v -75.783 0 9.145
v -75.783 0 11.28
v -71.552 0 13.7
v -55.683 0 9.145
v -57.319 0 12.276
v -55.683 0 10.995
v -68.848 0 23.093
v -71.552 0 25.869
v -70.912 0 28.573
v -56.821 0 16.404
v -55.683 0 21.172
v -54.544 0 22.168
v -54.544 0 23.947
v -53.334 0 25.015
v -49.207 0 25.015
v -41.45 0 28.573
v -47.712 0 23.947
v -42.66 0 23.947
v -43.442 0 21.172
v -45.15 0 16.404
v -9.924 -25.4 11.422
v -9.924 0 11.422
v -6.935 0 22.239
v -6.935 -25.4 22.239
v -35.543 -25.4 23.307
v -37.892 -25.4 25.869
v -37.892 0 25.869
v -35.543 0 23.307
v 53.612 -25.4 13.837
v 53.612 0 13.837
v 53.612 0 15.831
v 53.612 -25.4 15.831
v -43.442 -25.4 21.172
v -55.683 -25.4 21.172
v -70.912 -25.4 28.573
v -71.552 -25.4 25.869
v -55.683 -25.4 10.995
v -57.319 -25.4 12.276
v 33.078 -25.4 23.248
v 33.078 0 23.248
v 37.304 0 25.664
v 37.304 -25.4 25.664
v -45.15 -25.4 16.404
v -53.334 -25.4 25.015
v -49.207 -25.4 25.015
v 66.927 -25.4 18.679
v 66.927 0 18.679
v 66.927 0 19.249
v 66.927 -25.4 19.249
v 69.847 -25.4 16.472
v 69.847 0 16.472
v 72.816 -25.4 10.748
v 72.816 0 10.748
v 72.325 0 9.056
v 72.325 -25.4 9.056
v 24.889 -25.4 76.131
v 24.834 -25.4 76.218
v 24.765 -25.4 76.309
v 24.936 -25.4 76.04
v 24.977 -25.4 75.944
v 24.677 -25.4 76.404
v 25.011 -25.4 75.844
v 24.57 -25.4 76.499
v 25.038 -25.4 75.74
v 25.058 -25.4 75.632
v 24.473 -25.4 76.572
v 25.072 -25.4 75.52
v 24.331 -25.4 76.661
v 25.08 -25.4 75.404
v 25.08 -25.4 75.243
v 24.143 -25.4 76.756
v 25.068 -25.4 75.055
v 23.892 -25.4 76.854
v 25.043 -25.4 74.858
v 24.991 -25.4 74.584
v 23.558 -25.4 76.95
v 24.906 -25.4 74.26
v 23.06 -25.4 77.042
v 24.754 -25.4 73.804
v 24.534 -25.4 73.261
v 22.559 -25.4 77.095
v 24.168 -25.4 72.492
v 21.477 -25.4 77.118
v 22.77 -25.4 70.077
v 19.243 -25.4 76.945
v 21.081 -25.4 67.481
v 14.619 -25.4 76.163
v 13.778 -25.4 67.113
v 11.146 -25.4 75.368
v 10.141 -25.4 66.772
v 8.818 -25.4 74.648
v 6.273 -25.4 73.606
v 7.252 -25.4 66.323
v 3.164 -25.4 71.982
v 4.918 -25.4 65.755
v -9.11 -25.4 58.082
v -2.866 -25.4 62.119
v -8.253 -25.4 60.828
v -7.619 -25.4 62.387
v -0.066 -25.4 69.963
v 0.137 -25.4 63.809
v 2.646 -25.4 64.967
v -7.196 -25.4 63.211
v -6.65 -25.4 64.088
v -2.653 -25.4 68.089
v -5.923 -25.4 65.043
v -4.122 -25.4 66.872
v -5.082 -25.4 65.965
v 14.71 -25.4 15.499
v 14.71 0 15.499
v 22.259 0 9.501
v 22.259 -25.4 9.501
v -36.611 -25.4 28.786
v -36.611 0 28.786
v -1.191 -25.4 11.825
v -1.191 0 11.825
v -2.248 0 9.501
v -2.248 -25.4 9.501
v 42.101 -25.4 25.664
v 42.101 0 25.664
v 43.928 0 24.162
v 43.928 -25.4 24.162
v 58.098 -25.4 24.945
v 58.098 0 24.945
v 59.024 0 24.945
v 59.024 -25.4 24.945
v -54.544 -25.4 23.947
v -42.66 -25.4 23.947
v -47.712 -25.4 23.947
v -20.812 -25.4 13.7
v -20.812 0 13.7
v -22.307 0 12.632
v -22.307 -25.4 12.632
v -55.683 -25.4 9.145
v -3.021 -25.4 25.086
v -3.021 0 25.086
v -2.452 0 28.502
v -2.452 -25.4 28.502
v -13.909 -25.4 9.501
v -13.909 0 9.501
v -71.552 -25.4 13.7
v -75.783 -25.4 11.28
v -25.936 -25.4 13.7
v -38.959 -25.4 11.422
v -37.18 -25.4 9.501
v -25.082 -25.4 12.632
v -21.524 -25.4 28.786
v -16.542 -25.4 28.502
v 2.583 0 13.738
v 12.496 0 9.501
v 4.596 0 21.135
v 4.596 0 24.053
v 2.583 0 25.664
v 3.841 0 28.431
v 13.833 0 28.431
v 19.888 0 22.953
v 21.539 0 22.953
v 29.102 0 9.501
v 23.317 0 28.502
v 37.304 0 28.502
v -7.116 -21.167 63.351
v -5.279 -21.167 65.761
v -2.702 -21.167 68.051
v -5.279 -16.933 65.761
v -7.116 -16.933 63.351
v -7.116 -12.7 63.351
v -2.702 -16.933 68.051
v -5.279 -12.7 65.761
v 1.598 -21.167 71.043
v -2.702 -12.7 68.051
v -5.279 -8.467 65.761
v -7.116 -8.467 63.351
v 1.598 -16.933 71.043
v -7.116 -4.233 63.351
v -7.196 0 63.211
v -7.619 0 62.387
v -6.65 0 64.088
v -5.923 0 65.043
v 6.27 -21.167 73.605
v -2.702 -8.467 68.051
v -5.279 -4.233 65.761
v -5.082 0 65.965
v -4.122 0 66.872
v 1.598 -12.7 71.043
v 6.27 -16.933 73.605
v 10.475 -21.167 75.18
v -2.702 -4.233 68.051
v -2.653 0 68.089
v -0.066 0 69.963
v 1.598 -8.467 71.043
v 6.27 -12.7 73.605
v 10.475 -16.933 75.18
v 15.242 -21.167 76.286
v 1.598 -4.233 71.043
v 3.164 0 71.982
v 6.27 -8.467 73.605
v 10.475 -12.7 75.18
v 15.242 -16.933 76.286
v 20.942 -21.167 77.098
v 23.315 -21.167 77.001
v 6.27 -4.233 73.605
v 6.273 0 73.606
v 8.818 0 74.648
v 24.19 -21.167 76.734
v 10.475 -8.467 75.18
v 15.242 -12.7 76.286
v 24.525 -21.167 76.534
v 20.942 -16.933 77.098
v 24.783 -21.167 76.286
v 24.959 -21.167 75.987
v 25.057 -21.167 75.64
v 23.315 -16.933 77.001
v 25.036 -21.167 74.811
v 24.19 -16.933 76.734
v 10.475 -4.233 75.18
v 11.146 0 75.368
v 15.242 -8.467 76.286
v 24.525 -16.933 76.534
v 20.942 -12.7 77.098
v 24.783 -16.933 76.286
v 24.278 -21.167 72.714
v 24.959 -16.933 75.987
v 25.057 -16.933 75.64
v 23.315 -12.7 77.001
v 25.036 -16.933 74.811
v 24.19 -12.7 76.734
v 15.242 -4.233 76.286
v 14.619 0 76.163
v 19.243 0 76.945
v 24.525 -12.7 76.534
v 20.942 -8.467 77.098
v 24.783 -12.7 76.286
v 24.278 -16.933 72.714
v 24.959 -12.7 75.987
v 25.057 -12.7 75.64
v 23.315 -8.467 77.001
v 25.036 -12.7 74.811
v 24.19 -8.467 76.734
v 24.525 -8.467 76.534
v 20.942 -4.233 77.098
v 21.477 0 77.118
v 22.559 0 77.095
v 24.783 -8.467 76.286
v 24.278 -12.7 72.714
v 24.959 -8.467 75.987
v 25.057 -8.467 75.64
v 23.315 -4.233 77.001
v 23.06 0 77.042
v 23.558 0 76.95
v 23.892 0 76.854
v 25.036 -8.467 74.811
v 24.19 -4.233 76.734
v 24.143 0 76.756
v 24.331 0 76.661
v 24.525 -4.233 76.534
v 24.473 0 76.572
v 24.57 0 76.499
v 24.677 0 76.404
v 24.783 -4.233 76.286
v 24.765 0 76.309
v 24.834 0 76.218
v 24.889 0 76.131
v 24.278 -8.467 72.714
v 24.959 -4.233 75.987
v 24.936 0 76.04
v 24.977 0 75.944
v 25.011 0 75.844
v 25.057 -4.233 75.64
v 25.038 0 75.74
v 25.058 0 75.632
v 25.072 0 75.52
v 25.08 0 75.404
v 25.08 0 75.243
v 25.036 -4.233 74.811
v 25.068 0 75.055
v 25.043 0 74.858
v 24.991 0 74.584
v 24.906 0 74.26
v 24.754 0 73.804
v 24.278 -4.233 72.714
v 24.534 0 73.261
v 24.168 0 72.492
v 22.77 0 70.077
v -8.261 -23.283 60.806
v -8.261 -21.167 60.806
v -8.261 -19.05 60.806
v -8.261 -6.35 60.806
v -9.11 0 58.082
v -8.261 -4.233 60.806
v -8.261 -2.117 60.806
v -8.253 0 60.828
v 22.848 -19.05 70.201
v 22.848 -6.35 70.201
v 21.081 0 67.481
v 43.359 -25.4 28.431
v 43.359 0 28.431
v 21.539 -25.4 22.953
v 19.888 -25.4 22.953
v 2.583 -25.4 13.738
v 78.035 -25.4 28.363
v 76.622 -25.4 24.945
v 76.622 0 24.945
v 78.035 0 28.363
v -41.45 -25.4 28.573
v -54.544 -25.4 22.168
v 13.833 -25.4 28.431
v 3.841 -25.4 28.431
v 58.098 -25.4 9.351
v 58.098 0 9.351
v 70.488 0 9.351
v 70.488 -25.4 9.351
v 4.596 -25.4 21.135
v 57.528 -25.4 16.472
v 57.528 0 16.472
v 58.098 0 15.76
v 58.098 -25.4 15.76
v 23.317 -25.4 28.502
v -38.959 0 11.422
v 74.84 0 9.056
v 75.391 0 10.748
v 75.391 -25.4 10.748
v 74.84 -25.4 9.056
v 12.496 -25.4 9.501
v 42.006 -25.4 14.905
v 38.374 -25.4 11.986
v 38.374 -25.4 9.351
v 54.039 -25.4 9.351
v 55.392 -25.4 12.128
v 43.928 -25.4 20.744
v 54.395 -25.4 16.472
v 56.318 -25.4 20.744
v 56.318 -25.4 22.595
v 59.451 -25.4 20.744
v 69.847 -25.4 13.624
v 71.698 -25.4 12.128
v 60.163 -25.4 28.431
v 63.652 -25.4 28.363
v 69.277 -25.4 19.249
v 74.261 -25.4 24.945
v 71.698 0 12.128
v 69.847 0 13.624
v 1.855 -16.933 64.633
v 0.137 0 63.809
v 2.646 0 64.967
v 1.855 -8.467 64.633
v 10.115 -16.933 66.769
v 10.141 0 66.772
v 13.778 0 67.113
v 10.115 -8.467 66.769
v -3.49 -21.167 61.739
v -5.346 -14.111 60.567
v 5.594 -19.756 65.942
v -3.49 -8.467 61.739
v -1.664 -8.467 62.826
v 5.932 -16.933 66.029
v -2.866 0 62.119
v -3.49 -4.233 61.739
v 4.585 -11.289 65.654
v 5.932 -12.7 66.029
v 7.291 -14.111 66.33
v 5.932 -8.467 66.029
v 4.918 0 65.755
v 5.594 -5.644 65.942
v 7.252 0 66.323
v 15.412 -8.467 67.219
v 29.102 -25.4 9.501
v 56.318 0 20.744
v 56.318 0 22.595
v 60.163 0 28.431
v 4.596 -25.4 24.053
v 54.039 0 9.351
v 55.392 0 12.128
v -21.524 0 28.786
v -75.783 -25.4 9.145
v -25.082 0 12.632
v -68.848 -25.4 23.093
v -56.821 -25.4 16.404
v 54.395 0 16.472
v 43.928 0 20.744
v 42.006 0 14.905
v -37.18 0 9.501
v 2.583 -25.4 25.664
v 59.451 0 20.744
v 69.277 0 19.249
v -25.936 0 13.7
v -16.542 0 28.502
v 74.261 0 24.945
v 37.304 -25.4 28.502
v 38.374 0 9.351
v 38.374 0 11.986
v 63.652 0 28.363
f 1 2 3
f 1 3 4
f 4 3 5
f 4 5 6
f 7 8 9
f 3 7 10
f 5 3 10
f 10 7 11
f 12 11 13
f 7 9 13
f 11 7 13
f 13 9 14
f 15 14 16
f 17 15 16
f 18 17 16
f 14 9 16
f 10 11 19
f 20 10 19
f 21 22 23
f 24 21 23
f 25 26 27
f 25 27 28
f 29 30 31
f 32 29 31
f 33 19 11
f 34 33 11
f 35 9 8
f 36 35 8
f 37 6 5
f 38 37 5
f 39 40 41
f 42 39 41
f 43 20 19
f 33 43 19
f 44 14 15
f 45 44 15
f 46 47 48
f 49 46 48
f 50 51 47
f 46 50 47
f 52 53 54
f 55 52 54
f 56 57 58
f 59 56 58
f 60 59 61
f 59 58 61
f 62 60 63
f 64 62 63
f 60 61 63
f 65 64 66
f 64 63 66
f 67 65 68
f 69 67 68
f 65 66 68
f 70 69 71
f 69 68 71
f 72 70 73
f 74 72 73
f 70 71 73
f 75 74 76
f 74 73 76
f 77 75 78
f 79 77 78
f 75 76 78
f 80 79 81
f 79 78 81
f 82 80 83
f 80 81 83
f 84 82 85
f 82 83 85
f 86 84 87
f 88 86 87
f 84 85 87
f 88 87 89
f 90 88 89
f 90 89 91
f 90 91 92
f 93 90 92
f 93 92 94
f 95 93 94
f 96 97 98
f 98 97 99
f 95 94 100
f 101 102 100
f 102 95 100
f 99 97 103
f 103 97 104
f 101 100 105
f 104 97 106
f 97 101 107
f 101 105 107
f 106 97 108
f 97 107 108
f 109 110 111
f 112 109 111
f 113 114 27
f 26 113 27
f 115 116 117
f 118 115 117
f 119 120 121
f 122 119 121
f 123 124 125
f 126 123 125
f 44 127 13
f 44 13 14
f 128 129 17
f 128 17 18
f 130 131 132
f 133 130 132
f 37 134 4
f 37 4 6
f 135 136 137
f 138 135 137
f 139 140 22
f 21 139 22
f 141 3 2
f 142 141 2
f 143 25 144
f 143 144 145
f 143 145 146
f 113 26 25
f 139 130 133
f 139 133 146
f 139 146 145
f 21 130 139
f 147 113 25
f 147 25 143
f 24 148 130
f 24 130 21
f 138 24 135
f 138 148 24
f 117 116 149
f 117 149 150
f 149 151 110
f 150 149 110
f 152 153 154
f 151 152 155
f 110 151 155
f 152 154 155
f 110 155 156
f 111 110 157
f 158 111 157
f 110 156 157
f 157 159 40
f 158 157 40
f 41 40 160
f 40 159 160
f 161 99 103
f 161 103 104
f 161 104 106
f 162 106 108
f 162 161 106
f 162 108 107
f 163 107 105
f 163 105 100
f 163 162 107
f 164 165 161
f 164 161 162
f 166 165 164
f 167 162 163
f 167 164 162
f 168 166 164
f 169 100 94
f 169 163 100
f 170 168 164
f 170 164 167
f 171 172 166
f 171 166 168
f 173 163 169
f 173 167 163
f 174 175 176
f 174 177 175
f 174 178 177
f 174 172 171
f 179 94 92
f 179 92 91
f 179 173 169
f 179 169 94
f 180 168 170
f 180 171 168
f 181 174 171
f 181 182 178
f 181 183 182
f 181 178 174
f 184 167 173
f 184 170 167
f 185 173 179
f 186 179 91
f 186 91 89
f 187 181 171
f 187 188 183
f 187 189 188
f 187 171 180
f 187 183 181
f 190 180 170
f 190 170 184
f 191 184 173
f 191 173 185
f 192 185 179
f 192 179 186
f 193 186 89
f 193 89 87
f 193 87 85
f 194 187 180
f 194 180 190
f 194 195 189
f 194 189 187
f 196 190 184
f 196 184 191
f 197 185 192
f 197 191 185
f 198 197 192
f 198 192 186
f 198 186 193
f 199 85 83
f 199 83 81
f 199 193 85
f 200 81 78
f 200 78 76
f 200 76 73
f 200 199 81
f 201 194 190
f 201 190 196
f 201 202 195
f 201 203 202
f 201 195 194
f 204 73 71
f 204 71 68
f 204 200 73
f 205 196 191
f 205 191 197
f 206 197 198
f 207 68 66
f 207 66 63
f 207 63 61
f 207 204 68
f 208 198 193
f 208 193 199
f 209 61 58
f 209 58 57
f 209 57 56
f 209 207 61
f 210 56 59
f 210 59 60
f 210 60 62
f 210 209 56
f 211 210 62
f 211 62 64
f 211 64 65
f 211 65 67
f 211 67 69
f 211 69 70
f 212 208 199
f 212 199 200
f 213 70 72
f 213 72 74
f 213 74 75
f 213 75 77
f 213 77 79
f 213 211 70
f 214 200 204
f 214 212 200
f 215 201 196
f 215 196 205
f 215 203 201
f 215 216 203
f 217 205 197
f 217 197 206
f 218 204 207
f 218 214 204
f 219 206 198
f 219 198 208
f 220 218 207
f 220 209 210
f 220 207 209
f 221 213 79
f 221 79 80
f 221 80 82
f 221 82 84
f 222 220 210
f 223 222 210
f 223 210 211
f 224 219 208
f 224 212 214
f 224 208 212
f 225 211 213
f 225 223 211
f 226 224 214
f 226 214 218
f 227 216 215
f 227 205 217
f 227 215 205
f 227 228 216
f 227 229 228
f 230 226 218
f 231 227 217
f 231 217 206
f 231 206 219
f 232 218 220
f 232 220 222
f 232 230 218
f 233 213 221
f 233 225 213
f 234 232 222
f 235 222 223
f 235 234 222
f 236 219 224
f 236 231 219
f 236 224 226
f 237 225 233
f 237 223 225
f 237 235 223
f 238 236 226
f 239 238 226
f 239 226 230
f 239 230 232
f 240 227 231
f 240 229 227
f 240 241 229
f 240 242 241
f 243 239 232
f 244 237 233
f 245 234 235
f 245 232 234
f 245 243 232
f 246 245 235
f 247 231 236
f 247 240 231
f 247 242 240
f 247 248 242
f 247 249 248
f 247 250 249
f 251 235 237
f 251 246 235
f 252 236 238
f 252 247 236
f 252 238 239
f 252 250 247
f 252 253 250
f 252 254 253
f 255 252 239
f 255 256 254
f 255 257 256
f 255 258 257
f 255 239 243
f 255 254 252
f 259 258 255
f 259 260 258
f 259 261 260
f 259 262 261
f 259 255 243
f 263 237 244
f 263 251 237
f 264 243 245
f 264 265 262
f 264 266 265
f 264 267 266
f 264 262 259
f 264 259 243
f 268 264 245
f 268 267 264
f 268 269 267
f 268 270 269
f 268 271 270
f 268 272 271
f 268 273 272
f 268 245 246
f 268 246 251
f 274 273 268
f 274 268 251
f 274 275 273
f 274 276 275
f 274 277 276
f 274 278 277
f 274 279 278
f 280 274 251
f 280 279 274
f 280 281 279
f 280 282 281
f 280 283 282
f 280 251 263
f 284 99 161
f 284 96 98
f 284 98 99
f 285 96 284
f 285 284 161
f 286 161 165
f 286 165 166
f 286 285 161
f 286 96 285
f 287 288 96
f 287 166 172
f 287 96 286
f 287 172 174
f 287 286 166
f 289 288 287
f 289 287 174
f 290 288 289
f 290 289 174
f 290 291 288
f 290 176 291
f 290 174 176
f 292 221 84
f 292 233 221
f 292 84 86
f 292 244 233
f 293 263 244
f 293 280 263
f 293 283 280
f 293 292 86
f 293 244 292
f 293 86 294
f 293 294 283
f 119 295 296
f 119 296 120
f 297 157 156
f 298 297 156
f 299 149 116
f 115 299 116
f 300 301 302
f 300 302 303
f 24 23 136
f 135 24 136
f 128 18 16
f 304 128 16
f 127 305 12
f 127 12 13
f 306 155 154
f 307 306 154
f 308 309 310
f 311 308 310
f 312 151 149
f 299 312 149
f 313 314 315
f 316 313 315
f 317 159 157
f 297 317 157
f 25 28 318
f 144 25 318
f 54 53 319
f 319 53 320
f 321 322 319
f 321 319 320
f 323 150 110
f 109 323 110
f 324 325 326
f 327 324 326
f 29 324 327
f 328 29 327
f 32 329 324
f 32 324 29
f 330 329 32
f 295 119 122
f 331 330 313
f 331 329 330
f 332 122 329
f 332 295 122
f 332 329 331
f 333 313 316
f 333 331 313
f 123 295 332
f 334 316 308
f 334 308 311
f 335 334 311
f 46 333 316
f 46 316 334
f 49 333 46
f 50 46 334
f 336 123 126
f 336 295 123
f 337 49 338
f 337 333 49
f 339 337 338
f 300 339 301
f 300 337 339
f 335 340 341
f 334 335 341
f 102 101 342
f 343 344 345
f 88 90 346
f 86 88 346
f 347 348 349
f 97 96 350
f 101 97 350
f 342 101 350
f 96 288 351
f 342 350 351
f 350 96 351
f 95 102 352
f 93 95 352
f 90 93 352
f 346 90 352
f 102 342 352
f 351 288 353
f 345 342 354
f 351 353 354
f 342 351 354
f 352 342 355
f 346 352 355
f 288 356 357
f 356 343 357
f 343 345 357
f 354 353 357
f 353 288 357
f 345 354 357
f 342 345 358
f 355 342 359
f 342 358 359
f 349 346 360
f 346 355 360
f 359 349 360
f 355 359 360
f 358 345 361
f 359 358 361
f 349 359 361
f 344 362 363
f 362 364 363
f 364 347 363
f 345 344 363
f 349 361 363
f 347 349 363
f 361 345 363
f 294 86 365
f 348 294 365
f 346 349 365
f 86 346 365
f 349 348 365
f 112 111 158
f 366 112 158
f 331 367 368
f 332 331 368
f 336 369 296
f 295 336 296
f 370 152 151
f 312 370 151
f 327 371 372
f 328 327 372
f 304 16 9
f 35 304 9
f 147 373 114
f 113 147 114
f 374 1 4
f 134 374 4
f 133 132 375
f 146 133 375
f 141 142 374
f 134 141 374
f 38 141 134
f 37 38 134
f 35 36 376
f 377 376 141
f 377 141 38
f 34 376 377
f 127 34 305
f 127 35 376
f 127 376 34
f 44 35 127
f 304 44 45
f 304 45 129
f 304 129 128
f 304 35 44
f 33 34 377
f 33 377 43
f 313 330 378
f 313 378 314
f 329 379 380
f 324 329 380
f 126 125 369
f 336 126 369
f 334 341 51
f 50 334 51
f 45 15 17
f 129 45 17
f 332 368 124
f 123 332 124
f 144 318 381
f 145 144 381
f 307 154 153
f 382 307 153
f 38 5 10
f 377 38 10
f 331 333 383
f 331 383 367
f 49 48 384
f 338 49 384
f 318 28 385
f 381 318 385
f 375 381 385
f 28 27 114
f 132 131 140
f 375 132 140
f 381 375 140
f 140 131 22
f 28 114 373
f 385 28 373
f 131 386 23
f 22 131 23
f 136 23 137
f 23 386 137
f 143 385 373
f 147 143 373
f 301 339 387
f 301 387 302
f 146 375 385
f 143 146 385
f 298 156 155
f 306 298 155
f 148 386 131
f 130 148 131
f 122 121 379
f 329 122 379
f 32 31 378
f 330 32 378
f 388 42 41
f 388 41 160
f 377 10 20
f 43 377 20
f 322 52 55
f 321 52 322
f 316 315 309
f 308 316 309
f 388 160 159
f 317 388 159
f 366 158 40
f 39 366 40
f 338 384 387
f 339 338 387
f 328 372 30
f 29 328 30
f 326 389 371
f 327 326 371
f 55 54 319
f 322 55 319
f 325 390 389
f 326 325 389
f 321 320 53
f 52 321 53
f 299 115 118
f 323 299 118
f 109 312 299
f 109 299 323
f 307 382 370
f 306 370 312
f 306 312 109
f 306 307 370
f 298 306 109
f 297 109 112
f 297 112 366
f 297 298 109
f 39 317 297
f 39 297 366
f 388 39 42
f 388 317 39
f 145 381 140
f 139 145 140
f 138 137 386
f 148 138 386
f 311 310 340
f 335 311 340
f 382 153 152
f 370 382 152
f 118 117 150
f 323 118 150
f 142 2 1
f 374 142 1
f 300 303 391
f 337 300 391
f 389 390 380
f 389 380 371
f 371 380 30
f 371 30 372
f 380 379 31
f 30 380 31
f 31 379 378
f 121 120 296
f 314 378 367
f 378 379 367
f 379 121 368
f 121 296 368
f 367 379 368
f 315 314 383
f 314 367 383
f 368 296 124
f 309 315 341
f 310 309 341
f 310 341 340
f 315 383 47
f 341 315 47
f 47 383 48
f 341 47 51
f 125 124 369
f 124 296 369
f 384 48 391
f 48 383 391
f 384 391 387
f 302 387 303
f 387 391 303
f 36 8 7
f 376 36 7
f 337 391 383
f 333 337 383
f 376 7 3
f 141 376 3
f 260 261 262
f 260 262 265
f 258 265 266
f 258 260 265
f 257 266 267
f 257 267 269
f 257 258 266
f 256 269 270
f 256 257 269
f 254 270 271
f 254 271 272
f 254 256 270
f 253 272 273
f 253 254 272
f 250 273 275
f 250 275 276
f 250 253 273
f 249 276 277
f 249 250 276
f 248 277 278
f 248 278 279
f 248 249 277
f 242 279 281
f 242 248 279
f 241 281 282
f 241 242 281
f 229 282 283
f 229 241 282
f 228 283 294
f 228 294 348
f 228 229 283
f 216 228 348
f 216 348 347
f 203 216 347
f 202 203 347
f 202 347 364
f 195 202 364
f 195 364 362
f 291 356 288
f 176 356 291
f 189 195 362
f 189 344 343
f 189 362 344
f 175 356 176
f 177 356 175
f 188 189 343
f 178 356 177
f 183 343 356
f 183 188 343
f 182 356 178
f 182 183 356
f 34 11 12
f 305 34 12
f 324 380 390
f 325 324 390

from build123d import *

# Parameters (mm, degrees)
F1_DEPTH = 25.4


with BuildPart() as f1:
    # F0 (on Front) → F1 (new body)
    with BuildSketch(Plane.XZ):
        Polygon((-41.4497889578, 28.5728499293), (-70.9118098021, 28.5728499293), (-71.5522840619, 25.8686058223), (-68.8480436802, 23.0931974947), (-71.5522840619, 13.6995110661), (-75.783059001, 11.2799247727), (-75.783059001, 9.1449962929), (-55.6826479733, 9.1449962929), (-55.6826479733, 10.9952678904), (-57.3194250464, 12.276224792), (-56.8212755024, 16.4037533104), (-45.1503321528, 16.4037533104), (-43.4423871338, 21.1717616767), (-55.6826479733, 21.1717616767), (-54.5440167189, 22.1680626273), (-54.5440167189, 23.9471700042), (-53.3342249691, 25.0146333128), (-49.2066964507, 25.0146333128), (-47.7122440934, 23.9471700042), (-42.6595807076, 23.9471700042), align=None)
    extrude(amount=F1_DEPTH)


with BuildPart() as f1b:
    # F0 (on Front) → F1, piece 2 (new body)
    with BuildSketch(Plane.XZ):
        Polygon((-21.5237848461, 28.7863407284), (-36.6106182337, 28.7863407284), (-37.891574204, 25.8686058223), (-35.5431511998, 23.3066901565), (-38.9590375125, 11.4222532138), (-37.1799319983, 9.5008173957), (-13.9092057943, 9.5008173957), (-9.9240047857, 11.4222532138), (-6.9351056591, 22.2392268479), (-3.0210679397, 25.0857975334), (-2.4517541751, 28.5016838461), (-16.5422856808, 28.5016838461), (-20.8121426404, 13.6995110661), (-22.306593135, 12.6320458949), (-25.0820014626, 12.6320458949), (-25.9359721094, 13.6995110661), align=None)
    extrude(amount=F1_DEPTH)


with BuildPart() as f1c:
    # F0 (on Front) → F1, piece 3 (new body)
    with BuildSketch(Plane.XZ):
        Polygon((13.8333337381, 28.4313391894), (3.8411605638, 28.4313391894), (2.5831414387, 25.6636980921), (4.5959721319, 24.05343391), (4.5959721319, 21.1348310113), (2.5831414387, 13.7376794592), (-1.1909151217, 11.8254907429), (-2.2475851983, 9.5008173957), (12.4963307753, 9.5008173957), (14.7104430944, 15.4989054427), (22.2585573792, 9.5008173957), (29.1021801531, 9.5008173957), (33.077519387, 23.248301819), (37.3044610023, 25.6636980921), (37.3044610023, 28.5016838461), (23.3171563596, 28.5016838461), (21.538939327, 22.9532327503), (19.8877379298, 22.9532327503), align=None)
    extrude(amount=F1_DEPTH)


with BuildPart() as f1d:
    # F0 (on Front) → F1, piece 4 (new body)
    with BuildSketch(Plane.XZ):
        Polygon((60.1628646255, 28.4313391894), (43.3585867286, 28.4313391894), (42.1005676035, 25.6636980921), (43.9282208681, 24.1619292647), (43.9282208681, 20.7441095263), (42.0056991279, 14.9053353816), (38.3742675185, 11.985947378), (38.3742675185, 9.3513783067), (54.039273411, 9.3513783067), (55.3921572864, 12.1283568442), (53.6120459437, 13.8372667134), (53.6120459437, 14.9765396491), (53.6120459437, 15.830995515), (54.3952956796, 16.4718348533), (57.5282946229, 16.4718348533), (58.0979324877, 15.7597903162), (58.0979324877, 9.3513783067), (70.4875290394, 9.3513783067), (71.6980025172, 12.1283568442), (69.8466897011, 13.6236529797), (69.8466897011, 16.4718348533), (66.9272989035, 18.6791773885), (66.9272989035, 19.2488133907), (69.277048111, 19.2488133907), (74.2613747716, 24.9451808631), (76.6224040091, 24.9451808631), (78.0352130532, 28.3630006015), (63.6518895626, 28.3630006015), (59.4508200884, 20.7441095263), (56.3178211451, 20.7441095263), (56.3178211451, 22.595429793), (58.0979324877, 24.9451808631), (59.0235926211, 24.9451808631), align=None)
    extrude(amount=F1_DEPTH)


with BuildPart() as f1e:
    # F0 (on Front) → F1, piece 5 (new body)
    with BuildSketch(Plane.XZ):
        with BuildLine():
            add(Edge.make_bspline(
                [(-9.1101396829, 58.0822378397), (-8.5769252352, 59.9175009422), (-7.473268579, 63.716160839), (-2.835246629, 68.3423020327), (6.453585838, 74.2352841812), (14.1777091225, 76.247779232), (28.3724768602, 78.4975007774), (23.5116687235, 71.1539976627), (21.0806000978, 67.4812421203)],
                knots=[0, 0, 0, 0, 0.1364049663, 0.2823334021, 0.4690120692, 0.6448696999, 0.8223862974, 1, 1, 1, 1], degree=3))
            add(Edge.make_bspline(
                [(-9.1101396829, 58.0822378397), (-5.332912296, 60.6051376981), (1.5313036285, 65.1899104984), (10.0724630023, 67.0375369348), (17.259832511, 67.3272383705), (21.0806000978, 67.4812421203)],
                knots=[0, 0, 0, 0, 0.3643282344, 0.6620802541, 1, 1, 1, 1], degree=3))
        make_face()
    extrude(amount=F1_DEPTH)


with BuildPart() as f1f:
    # F0 (on Front) → F1, piece 6 (new body)
    with BuildSketch(Plane.XZ):
        Polygon((75.3912478685, 10.7475100085), (72.8158503771, 10.7475100085), (72.3245069385, 9.0564358979), (74.840053916, 9.0564358979), align=None)
    extrude(amount=F1_DEPTH)


solid = Compound([f1.part, f1b.part, f1c.part, f1d.part, f1e.part, f1f.part])
